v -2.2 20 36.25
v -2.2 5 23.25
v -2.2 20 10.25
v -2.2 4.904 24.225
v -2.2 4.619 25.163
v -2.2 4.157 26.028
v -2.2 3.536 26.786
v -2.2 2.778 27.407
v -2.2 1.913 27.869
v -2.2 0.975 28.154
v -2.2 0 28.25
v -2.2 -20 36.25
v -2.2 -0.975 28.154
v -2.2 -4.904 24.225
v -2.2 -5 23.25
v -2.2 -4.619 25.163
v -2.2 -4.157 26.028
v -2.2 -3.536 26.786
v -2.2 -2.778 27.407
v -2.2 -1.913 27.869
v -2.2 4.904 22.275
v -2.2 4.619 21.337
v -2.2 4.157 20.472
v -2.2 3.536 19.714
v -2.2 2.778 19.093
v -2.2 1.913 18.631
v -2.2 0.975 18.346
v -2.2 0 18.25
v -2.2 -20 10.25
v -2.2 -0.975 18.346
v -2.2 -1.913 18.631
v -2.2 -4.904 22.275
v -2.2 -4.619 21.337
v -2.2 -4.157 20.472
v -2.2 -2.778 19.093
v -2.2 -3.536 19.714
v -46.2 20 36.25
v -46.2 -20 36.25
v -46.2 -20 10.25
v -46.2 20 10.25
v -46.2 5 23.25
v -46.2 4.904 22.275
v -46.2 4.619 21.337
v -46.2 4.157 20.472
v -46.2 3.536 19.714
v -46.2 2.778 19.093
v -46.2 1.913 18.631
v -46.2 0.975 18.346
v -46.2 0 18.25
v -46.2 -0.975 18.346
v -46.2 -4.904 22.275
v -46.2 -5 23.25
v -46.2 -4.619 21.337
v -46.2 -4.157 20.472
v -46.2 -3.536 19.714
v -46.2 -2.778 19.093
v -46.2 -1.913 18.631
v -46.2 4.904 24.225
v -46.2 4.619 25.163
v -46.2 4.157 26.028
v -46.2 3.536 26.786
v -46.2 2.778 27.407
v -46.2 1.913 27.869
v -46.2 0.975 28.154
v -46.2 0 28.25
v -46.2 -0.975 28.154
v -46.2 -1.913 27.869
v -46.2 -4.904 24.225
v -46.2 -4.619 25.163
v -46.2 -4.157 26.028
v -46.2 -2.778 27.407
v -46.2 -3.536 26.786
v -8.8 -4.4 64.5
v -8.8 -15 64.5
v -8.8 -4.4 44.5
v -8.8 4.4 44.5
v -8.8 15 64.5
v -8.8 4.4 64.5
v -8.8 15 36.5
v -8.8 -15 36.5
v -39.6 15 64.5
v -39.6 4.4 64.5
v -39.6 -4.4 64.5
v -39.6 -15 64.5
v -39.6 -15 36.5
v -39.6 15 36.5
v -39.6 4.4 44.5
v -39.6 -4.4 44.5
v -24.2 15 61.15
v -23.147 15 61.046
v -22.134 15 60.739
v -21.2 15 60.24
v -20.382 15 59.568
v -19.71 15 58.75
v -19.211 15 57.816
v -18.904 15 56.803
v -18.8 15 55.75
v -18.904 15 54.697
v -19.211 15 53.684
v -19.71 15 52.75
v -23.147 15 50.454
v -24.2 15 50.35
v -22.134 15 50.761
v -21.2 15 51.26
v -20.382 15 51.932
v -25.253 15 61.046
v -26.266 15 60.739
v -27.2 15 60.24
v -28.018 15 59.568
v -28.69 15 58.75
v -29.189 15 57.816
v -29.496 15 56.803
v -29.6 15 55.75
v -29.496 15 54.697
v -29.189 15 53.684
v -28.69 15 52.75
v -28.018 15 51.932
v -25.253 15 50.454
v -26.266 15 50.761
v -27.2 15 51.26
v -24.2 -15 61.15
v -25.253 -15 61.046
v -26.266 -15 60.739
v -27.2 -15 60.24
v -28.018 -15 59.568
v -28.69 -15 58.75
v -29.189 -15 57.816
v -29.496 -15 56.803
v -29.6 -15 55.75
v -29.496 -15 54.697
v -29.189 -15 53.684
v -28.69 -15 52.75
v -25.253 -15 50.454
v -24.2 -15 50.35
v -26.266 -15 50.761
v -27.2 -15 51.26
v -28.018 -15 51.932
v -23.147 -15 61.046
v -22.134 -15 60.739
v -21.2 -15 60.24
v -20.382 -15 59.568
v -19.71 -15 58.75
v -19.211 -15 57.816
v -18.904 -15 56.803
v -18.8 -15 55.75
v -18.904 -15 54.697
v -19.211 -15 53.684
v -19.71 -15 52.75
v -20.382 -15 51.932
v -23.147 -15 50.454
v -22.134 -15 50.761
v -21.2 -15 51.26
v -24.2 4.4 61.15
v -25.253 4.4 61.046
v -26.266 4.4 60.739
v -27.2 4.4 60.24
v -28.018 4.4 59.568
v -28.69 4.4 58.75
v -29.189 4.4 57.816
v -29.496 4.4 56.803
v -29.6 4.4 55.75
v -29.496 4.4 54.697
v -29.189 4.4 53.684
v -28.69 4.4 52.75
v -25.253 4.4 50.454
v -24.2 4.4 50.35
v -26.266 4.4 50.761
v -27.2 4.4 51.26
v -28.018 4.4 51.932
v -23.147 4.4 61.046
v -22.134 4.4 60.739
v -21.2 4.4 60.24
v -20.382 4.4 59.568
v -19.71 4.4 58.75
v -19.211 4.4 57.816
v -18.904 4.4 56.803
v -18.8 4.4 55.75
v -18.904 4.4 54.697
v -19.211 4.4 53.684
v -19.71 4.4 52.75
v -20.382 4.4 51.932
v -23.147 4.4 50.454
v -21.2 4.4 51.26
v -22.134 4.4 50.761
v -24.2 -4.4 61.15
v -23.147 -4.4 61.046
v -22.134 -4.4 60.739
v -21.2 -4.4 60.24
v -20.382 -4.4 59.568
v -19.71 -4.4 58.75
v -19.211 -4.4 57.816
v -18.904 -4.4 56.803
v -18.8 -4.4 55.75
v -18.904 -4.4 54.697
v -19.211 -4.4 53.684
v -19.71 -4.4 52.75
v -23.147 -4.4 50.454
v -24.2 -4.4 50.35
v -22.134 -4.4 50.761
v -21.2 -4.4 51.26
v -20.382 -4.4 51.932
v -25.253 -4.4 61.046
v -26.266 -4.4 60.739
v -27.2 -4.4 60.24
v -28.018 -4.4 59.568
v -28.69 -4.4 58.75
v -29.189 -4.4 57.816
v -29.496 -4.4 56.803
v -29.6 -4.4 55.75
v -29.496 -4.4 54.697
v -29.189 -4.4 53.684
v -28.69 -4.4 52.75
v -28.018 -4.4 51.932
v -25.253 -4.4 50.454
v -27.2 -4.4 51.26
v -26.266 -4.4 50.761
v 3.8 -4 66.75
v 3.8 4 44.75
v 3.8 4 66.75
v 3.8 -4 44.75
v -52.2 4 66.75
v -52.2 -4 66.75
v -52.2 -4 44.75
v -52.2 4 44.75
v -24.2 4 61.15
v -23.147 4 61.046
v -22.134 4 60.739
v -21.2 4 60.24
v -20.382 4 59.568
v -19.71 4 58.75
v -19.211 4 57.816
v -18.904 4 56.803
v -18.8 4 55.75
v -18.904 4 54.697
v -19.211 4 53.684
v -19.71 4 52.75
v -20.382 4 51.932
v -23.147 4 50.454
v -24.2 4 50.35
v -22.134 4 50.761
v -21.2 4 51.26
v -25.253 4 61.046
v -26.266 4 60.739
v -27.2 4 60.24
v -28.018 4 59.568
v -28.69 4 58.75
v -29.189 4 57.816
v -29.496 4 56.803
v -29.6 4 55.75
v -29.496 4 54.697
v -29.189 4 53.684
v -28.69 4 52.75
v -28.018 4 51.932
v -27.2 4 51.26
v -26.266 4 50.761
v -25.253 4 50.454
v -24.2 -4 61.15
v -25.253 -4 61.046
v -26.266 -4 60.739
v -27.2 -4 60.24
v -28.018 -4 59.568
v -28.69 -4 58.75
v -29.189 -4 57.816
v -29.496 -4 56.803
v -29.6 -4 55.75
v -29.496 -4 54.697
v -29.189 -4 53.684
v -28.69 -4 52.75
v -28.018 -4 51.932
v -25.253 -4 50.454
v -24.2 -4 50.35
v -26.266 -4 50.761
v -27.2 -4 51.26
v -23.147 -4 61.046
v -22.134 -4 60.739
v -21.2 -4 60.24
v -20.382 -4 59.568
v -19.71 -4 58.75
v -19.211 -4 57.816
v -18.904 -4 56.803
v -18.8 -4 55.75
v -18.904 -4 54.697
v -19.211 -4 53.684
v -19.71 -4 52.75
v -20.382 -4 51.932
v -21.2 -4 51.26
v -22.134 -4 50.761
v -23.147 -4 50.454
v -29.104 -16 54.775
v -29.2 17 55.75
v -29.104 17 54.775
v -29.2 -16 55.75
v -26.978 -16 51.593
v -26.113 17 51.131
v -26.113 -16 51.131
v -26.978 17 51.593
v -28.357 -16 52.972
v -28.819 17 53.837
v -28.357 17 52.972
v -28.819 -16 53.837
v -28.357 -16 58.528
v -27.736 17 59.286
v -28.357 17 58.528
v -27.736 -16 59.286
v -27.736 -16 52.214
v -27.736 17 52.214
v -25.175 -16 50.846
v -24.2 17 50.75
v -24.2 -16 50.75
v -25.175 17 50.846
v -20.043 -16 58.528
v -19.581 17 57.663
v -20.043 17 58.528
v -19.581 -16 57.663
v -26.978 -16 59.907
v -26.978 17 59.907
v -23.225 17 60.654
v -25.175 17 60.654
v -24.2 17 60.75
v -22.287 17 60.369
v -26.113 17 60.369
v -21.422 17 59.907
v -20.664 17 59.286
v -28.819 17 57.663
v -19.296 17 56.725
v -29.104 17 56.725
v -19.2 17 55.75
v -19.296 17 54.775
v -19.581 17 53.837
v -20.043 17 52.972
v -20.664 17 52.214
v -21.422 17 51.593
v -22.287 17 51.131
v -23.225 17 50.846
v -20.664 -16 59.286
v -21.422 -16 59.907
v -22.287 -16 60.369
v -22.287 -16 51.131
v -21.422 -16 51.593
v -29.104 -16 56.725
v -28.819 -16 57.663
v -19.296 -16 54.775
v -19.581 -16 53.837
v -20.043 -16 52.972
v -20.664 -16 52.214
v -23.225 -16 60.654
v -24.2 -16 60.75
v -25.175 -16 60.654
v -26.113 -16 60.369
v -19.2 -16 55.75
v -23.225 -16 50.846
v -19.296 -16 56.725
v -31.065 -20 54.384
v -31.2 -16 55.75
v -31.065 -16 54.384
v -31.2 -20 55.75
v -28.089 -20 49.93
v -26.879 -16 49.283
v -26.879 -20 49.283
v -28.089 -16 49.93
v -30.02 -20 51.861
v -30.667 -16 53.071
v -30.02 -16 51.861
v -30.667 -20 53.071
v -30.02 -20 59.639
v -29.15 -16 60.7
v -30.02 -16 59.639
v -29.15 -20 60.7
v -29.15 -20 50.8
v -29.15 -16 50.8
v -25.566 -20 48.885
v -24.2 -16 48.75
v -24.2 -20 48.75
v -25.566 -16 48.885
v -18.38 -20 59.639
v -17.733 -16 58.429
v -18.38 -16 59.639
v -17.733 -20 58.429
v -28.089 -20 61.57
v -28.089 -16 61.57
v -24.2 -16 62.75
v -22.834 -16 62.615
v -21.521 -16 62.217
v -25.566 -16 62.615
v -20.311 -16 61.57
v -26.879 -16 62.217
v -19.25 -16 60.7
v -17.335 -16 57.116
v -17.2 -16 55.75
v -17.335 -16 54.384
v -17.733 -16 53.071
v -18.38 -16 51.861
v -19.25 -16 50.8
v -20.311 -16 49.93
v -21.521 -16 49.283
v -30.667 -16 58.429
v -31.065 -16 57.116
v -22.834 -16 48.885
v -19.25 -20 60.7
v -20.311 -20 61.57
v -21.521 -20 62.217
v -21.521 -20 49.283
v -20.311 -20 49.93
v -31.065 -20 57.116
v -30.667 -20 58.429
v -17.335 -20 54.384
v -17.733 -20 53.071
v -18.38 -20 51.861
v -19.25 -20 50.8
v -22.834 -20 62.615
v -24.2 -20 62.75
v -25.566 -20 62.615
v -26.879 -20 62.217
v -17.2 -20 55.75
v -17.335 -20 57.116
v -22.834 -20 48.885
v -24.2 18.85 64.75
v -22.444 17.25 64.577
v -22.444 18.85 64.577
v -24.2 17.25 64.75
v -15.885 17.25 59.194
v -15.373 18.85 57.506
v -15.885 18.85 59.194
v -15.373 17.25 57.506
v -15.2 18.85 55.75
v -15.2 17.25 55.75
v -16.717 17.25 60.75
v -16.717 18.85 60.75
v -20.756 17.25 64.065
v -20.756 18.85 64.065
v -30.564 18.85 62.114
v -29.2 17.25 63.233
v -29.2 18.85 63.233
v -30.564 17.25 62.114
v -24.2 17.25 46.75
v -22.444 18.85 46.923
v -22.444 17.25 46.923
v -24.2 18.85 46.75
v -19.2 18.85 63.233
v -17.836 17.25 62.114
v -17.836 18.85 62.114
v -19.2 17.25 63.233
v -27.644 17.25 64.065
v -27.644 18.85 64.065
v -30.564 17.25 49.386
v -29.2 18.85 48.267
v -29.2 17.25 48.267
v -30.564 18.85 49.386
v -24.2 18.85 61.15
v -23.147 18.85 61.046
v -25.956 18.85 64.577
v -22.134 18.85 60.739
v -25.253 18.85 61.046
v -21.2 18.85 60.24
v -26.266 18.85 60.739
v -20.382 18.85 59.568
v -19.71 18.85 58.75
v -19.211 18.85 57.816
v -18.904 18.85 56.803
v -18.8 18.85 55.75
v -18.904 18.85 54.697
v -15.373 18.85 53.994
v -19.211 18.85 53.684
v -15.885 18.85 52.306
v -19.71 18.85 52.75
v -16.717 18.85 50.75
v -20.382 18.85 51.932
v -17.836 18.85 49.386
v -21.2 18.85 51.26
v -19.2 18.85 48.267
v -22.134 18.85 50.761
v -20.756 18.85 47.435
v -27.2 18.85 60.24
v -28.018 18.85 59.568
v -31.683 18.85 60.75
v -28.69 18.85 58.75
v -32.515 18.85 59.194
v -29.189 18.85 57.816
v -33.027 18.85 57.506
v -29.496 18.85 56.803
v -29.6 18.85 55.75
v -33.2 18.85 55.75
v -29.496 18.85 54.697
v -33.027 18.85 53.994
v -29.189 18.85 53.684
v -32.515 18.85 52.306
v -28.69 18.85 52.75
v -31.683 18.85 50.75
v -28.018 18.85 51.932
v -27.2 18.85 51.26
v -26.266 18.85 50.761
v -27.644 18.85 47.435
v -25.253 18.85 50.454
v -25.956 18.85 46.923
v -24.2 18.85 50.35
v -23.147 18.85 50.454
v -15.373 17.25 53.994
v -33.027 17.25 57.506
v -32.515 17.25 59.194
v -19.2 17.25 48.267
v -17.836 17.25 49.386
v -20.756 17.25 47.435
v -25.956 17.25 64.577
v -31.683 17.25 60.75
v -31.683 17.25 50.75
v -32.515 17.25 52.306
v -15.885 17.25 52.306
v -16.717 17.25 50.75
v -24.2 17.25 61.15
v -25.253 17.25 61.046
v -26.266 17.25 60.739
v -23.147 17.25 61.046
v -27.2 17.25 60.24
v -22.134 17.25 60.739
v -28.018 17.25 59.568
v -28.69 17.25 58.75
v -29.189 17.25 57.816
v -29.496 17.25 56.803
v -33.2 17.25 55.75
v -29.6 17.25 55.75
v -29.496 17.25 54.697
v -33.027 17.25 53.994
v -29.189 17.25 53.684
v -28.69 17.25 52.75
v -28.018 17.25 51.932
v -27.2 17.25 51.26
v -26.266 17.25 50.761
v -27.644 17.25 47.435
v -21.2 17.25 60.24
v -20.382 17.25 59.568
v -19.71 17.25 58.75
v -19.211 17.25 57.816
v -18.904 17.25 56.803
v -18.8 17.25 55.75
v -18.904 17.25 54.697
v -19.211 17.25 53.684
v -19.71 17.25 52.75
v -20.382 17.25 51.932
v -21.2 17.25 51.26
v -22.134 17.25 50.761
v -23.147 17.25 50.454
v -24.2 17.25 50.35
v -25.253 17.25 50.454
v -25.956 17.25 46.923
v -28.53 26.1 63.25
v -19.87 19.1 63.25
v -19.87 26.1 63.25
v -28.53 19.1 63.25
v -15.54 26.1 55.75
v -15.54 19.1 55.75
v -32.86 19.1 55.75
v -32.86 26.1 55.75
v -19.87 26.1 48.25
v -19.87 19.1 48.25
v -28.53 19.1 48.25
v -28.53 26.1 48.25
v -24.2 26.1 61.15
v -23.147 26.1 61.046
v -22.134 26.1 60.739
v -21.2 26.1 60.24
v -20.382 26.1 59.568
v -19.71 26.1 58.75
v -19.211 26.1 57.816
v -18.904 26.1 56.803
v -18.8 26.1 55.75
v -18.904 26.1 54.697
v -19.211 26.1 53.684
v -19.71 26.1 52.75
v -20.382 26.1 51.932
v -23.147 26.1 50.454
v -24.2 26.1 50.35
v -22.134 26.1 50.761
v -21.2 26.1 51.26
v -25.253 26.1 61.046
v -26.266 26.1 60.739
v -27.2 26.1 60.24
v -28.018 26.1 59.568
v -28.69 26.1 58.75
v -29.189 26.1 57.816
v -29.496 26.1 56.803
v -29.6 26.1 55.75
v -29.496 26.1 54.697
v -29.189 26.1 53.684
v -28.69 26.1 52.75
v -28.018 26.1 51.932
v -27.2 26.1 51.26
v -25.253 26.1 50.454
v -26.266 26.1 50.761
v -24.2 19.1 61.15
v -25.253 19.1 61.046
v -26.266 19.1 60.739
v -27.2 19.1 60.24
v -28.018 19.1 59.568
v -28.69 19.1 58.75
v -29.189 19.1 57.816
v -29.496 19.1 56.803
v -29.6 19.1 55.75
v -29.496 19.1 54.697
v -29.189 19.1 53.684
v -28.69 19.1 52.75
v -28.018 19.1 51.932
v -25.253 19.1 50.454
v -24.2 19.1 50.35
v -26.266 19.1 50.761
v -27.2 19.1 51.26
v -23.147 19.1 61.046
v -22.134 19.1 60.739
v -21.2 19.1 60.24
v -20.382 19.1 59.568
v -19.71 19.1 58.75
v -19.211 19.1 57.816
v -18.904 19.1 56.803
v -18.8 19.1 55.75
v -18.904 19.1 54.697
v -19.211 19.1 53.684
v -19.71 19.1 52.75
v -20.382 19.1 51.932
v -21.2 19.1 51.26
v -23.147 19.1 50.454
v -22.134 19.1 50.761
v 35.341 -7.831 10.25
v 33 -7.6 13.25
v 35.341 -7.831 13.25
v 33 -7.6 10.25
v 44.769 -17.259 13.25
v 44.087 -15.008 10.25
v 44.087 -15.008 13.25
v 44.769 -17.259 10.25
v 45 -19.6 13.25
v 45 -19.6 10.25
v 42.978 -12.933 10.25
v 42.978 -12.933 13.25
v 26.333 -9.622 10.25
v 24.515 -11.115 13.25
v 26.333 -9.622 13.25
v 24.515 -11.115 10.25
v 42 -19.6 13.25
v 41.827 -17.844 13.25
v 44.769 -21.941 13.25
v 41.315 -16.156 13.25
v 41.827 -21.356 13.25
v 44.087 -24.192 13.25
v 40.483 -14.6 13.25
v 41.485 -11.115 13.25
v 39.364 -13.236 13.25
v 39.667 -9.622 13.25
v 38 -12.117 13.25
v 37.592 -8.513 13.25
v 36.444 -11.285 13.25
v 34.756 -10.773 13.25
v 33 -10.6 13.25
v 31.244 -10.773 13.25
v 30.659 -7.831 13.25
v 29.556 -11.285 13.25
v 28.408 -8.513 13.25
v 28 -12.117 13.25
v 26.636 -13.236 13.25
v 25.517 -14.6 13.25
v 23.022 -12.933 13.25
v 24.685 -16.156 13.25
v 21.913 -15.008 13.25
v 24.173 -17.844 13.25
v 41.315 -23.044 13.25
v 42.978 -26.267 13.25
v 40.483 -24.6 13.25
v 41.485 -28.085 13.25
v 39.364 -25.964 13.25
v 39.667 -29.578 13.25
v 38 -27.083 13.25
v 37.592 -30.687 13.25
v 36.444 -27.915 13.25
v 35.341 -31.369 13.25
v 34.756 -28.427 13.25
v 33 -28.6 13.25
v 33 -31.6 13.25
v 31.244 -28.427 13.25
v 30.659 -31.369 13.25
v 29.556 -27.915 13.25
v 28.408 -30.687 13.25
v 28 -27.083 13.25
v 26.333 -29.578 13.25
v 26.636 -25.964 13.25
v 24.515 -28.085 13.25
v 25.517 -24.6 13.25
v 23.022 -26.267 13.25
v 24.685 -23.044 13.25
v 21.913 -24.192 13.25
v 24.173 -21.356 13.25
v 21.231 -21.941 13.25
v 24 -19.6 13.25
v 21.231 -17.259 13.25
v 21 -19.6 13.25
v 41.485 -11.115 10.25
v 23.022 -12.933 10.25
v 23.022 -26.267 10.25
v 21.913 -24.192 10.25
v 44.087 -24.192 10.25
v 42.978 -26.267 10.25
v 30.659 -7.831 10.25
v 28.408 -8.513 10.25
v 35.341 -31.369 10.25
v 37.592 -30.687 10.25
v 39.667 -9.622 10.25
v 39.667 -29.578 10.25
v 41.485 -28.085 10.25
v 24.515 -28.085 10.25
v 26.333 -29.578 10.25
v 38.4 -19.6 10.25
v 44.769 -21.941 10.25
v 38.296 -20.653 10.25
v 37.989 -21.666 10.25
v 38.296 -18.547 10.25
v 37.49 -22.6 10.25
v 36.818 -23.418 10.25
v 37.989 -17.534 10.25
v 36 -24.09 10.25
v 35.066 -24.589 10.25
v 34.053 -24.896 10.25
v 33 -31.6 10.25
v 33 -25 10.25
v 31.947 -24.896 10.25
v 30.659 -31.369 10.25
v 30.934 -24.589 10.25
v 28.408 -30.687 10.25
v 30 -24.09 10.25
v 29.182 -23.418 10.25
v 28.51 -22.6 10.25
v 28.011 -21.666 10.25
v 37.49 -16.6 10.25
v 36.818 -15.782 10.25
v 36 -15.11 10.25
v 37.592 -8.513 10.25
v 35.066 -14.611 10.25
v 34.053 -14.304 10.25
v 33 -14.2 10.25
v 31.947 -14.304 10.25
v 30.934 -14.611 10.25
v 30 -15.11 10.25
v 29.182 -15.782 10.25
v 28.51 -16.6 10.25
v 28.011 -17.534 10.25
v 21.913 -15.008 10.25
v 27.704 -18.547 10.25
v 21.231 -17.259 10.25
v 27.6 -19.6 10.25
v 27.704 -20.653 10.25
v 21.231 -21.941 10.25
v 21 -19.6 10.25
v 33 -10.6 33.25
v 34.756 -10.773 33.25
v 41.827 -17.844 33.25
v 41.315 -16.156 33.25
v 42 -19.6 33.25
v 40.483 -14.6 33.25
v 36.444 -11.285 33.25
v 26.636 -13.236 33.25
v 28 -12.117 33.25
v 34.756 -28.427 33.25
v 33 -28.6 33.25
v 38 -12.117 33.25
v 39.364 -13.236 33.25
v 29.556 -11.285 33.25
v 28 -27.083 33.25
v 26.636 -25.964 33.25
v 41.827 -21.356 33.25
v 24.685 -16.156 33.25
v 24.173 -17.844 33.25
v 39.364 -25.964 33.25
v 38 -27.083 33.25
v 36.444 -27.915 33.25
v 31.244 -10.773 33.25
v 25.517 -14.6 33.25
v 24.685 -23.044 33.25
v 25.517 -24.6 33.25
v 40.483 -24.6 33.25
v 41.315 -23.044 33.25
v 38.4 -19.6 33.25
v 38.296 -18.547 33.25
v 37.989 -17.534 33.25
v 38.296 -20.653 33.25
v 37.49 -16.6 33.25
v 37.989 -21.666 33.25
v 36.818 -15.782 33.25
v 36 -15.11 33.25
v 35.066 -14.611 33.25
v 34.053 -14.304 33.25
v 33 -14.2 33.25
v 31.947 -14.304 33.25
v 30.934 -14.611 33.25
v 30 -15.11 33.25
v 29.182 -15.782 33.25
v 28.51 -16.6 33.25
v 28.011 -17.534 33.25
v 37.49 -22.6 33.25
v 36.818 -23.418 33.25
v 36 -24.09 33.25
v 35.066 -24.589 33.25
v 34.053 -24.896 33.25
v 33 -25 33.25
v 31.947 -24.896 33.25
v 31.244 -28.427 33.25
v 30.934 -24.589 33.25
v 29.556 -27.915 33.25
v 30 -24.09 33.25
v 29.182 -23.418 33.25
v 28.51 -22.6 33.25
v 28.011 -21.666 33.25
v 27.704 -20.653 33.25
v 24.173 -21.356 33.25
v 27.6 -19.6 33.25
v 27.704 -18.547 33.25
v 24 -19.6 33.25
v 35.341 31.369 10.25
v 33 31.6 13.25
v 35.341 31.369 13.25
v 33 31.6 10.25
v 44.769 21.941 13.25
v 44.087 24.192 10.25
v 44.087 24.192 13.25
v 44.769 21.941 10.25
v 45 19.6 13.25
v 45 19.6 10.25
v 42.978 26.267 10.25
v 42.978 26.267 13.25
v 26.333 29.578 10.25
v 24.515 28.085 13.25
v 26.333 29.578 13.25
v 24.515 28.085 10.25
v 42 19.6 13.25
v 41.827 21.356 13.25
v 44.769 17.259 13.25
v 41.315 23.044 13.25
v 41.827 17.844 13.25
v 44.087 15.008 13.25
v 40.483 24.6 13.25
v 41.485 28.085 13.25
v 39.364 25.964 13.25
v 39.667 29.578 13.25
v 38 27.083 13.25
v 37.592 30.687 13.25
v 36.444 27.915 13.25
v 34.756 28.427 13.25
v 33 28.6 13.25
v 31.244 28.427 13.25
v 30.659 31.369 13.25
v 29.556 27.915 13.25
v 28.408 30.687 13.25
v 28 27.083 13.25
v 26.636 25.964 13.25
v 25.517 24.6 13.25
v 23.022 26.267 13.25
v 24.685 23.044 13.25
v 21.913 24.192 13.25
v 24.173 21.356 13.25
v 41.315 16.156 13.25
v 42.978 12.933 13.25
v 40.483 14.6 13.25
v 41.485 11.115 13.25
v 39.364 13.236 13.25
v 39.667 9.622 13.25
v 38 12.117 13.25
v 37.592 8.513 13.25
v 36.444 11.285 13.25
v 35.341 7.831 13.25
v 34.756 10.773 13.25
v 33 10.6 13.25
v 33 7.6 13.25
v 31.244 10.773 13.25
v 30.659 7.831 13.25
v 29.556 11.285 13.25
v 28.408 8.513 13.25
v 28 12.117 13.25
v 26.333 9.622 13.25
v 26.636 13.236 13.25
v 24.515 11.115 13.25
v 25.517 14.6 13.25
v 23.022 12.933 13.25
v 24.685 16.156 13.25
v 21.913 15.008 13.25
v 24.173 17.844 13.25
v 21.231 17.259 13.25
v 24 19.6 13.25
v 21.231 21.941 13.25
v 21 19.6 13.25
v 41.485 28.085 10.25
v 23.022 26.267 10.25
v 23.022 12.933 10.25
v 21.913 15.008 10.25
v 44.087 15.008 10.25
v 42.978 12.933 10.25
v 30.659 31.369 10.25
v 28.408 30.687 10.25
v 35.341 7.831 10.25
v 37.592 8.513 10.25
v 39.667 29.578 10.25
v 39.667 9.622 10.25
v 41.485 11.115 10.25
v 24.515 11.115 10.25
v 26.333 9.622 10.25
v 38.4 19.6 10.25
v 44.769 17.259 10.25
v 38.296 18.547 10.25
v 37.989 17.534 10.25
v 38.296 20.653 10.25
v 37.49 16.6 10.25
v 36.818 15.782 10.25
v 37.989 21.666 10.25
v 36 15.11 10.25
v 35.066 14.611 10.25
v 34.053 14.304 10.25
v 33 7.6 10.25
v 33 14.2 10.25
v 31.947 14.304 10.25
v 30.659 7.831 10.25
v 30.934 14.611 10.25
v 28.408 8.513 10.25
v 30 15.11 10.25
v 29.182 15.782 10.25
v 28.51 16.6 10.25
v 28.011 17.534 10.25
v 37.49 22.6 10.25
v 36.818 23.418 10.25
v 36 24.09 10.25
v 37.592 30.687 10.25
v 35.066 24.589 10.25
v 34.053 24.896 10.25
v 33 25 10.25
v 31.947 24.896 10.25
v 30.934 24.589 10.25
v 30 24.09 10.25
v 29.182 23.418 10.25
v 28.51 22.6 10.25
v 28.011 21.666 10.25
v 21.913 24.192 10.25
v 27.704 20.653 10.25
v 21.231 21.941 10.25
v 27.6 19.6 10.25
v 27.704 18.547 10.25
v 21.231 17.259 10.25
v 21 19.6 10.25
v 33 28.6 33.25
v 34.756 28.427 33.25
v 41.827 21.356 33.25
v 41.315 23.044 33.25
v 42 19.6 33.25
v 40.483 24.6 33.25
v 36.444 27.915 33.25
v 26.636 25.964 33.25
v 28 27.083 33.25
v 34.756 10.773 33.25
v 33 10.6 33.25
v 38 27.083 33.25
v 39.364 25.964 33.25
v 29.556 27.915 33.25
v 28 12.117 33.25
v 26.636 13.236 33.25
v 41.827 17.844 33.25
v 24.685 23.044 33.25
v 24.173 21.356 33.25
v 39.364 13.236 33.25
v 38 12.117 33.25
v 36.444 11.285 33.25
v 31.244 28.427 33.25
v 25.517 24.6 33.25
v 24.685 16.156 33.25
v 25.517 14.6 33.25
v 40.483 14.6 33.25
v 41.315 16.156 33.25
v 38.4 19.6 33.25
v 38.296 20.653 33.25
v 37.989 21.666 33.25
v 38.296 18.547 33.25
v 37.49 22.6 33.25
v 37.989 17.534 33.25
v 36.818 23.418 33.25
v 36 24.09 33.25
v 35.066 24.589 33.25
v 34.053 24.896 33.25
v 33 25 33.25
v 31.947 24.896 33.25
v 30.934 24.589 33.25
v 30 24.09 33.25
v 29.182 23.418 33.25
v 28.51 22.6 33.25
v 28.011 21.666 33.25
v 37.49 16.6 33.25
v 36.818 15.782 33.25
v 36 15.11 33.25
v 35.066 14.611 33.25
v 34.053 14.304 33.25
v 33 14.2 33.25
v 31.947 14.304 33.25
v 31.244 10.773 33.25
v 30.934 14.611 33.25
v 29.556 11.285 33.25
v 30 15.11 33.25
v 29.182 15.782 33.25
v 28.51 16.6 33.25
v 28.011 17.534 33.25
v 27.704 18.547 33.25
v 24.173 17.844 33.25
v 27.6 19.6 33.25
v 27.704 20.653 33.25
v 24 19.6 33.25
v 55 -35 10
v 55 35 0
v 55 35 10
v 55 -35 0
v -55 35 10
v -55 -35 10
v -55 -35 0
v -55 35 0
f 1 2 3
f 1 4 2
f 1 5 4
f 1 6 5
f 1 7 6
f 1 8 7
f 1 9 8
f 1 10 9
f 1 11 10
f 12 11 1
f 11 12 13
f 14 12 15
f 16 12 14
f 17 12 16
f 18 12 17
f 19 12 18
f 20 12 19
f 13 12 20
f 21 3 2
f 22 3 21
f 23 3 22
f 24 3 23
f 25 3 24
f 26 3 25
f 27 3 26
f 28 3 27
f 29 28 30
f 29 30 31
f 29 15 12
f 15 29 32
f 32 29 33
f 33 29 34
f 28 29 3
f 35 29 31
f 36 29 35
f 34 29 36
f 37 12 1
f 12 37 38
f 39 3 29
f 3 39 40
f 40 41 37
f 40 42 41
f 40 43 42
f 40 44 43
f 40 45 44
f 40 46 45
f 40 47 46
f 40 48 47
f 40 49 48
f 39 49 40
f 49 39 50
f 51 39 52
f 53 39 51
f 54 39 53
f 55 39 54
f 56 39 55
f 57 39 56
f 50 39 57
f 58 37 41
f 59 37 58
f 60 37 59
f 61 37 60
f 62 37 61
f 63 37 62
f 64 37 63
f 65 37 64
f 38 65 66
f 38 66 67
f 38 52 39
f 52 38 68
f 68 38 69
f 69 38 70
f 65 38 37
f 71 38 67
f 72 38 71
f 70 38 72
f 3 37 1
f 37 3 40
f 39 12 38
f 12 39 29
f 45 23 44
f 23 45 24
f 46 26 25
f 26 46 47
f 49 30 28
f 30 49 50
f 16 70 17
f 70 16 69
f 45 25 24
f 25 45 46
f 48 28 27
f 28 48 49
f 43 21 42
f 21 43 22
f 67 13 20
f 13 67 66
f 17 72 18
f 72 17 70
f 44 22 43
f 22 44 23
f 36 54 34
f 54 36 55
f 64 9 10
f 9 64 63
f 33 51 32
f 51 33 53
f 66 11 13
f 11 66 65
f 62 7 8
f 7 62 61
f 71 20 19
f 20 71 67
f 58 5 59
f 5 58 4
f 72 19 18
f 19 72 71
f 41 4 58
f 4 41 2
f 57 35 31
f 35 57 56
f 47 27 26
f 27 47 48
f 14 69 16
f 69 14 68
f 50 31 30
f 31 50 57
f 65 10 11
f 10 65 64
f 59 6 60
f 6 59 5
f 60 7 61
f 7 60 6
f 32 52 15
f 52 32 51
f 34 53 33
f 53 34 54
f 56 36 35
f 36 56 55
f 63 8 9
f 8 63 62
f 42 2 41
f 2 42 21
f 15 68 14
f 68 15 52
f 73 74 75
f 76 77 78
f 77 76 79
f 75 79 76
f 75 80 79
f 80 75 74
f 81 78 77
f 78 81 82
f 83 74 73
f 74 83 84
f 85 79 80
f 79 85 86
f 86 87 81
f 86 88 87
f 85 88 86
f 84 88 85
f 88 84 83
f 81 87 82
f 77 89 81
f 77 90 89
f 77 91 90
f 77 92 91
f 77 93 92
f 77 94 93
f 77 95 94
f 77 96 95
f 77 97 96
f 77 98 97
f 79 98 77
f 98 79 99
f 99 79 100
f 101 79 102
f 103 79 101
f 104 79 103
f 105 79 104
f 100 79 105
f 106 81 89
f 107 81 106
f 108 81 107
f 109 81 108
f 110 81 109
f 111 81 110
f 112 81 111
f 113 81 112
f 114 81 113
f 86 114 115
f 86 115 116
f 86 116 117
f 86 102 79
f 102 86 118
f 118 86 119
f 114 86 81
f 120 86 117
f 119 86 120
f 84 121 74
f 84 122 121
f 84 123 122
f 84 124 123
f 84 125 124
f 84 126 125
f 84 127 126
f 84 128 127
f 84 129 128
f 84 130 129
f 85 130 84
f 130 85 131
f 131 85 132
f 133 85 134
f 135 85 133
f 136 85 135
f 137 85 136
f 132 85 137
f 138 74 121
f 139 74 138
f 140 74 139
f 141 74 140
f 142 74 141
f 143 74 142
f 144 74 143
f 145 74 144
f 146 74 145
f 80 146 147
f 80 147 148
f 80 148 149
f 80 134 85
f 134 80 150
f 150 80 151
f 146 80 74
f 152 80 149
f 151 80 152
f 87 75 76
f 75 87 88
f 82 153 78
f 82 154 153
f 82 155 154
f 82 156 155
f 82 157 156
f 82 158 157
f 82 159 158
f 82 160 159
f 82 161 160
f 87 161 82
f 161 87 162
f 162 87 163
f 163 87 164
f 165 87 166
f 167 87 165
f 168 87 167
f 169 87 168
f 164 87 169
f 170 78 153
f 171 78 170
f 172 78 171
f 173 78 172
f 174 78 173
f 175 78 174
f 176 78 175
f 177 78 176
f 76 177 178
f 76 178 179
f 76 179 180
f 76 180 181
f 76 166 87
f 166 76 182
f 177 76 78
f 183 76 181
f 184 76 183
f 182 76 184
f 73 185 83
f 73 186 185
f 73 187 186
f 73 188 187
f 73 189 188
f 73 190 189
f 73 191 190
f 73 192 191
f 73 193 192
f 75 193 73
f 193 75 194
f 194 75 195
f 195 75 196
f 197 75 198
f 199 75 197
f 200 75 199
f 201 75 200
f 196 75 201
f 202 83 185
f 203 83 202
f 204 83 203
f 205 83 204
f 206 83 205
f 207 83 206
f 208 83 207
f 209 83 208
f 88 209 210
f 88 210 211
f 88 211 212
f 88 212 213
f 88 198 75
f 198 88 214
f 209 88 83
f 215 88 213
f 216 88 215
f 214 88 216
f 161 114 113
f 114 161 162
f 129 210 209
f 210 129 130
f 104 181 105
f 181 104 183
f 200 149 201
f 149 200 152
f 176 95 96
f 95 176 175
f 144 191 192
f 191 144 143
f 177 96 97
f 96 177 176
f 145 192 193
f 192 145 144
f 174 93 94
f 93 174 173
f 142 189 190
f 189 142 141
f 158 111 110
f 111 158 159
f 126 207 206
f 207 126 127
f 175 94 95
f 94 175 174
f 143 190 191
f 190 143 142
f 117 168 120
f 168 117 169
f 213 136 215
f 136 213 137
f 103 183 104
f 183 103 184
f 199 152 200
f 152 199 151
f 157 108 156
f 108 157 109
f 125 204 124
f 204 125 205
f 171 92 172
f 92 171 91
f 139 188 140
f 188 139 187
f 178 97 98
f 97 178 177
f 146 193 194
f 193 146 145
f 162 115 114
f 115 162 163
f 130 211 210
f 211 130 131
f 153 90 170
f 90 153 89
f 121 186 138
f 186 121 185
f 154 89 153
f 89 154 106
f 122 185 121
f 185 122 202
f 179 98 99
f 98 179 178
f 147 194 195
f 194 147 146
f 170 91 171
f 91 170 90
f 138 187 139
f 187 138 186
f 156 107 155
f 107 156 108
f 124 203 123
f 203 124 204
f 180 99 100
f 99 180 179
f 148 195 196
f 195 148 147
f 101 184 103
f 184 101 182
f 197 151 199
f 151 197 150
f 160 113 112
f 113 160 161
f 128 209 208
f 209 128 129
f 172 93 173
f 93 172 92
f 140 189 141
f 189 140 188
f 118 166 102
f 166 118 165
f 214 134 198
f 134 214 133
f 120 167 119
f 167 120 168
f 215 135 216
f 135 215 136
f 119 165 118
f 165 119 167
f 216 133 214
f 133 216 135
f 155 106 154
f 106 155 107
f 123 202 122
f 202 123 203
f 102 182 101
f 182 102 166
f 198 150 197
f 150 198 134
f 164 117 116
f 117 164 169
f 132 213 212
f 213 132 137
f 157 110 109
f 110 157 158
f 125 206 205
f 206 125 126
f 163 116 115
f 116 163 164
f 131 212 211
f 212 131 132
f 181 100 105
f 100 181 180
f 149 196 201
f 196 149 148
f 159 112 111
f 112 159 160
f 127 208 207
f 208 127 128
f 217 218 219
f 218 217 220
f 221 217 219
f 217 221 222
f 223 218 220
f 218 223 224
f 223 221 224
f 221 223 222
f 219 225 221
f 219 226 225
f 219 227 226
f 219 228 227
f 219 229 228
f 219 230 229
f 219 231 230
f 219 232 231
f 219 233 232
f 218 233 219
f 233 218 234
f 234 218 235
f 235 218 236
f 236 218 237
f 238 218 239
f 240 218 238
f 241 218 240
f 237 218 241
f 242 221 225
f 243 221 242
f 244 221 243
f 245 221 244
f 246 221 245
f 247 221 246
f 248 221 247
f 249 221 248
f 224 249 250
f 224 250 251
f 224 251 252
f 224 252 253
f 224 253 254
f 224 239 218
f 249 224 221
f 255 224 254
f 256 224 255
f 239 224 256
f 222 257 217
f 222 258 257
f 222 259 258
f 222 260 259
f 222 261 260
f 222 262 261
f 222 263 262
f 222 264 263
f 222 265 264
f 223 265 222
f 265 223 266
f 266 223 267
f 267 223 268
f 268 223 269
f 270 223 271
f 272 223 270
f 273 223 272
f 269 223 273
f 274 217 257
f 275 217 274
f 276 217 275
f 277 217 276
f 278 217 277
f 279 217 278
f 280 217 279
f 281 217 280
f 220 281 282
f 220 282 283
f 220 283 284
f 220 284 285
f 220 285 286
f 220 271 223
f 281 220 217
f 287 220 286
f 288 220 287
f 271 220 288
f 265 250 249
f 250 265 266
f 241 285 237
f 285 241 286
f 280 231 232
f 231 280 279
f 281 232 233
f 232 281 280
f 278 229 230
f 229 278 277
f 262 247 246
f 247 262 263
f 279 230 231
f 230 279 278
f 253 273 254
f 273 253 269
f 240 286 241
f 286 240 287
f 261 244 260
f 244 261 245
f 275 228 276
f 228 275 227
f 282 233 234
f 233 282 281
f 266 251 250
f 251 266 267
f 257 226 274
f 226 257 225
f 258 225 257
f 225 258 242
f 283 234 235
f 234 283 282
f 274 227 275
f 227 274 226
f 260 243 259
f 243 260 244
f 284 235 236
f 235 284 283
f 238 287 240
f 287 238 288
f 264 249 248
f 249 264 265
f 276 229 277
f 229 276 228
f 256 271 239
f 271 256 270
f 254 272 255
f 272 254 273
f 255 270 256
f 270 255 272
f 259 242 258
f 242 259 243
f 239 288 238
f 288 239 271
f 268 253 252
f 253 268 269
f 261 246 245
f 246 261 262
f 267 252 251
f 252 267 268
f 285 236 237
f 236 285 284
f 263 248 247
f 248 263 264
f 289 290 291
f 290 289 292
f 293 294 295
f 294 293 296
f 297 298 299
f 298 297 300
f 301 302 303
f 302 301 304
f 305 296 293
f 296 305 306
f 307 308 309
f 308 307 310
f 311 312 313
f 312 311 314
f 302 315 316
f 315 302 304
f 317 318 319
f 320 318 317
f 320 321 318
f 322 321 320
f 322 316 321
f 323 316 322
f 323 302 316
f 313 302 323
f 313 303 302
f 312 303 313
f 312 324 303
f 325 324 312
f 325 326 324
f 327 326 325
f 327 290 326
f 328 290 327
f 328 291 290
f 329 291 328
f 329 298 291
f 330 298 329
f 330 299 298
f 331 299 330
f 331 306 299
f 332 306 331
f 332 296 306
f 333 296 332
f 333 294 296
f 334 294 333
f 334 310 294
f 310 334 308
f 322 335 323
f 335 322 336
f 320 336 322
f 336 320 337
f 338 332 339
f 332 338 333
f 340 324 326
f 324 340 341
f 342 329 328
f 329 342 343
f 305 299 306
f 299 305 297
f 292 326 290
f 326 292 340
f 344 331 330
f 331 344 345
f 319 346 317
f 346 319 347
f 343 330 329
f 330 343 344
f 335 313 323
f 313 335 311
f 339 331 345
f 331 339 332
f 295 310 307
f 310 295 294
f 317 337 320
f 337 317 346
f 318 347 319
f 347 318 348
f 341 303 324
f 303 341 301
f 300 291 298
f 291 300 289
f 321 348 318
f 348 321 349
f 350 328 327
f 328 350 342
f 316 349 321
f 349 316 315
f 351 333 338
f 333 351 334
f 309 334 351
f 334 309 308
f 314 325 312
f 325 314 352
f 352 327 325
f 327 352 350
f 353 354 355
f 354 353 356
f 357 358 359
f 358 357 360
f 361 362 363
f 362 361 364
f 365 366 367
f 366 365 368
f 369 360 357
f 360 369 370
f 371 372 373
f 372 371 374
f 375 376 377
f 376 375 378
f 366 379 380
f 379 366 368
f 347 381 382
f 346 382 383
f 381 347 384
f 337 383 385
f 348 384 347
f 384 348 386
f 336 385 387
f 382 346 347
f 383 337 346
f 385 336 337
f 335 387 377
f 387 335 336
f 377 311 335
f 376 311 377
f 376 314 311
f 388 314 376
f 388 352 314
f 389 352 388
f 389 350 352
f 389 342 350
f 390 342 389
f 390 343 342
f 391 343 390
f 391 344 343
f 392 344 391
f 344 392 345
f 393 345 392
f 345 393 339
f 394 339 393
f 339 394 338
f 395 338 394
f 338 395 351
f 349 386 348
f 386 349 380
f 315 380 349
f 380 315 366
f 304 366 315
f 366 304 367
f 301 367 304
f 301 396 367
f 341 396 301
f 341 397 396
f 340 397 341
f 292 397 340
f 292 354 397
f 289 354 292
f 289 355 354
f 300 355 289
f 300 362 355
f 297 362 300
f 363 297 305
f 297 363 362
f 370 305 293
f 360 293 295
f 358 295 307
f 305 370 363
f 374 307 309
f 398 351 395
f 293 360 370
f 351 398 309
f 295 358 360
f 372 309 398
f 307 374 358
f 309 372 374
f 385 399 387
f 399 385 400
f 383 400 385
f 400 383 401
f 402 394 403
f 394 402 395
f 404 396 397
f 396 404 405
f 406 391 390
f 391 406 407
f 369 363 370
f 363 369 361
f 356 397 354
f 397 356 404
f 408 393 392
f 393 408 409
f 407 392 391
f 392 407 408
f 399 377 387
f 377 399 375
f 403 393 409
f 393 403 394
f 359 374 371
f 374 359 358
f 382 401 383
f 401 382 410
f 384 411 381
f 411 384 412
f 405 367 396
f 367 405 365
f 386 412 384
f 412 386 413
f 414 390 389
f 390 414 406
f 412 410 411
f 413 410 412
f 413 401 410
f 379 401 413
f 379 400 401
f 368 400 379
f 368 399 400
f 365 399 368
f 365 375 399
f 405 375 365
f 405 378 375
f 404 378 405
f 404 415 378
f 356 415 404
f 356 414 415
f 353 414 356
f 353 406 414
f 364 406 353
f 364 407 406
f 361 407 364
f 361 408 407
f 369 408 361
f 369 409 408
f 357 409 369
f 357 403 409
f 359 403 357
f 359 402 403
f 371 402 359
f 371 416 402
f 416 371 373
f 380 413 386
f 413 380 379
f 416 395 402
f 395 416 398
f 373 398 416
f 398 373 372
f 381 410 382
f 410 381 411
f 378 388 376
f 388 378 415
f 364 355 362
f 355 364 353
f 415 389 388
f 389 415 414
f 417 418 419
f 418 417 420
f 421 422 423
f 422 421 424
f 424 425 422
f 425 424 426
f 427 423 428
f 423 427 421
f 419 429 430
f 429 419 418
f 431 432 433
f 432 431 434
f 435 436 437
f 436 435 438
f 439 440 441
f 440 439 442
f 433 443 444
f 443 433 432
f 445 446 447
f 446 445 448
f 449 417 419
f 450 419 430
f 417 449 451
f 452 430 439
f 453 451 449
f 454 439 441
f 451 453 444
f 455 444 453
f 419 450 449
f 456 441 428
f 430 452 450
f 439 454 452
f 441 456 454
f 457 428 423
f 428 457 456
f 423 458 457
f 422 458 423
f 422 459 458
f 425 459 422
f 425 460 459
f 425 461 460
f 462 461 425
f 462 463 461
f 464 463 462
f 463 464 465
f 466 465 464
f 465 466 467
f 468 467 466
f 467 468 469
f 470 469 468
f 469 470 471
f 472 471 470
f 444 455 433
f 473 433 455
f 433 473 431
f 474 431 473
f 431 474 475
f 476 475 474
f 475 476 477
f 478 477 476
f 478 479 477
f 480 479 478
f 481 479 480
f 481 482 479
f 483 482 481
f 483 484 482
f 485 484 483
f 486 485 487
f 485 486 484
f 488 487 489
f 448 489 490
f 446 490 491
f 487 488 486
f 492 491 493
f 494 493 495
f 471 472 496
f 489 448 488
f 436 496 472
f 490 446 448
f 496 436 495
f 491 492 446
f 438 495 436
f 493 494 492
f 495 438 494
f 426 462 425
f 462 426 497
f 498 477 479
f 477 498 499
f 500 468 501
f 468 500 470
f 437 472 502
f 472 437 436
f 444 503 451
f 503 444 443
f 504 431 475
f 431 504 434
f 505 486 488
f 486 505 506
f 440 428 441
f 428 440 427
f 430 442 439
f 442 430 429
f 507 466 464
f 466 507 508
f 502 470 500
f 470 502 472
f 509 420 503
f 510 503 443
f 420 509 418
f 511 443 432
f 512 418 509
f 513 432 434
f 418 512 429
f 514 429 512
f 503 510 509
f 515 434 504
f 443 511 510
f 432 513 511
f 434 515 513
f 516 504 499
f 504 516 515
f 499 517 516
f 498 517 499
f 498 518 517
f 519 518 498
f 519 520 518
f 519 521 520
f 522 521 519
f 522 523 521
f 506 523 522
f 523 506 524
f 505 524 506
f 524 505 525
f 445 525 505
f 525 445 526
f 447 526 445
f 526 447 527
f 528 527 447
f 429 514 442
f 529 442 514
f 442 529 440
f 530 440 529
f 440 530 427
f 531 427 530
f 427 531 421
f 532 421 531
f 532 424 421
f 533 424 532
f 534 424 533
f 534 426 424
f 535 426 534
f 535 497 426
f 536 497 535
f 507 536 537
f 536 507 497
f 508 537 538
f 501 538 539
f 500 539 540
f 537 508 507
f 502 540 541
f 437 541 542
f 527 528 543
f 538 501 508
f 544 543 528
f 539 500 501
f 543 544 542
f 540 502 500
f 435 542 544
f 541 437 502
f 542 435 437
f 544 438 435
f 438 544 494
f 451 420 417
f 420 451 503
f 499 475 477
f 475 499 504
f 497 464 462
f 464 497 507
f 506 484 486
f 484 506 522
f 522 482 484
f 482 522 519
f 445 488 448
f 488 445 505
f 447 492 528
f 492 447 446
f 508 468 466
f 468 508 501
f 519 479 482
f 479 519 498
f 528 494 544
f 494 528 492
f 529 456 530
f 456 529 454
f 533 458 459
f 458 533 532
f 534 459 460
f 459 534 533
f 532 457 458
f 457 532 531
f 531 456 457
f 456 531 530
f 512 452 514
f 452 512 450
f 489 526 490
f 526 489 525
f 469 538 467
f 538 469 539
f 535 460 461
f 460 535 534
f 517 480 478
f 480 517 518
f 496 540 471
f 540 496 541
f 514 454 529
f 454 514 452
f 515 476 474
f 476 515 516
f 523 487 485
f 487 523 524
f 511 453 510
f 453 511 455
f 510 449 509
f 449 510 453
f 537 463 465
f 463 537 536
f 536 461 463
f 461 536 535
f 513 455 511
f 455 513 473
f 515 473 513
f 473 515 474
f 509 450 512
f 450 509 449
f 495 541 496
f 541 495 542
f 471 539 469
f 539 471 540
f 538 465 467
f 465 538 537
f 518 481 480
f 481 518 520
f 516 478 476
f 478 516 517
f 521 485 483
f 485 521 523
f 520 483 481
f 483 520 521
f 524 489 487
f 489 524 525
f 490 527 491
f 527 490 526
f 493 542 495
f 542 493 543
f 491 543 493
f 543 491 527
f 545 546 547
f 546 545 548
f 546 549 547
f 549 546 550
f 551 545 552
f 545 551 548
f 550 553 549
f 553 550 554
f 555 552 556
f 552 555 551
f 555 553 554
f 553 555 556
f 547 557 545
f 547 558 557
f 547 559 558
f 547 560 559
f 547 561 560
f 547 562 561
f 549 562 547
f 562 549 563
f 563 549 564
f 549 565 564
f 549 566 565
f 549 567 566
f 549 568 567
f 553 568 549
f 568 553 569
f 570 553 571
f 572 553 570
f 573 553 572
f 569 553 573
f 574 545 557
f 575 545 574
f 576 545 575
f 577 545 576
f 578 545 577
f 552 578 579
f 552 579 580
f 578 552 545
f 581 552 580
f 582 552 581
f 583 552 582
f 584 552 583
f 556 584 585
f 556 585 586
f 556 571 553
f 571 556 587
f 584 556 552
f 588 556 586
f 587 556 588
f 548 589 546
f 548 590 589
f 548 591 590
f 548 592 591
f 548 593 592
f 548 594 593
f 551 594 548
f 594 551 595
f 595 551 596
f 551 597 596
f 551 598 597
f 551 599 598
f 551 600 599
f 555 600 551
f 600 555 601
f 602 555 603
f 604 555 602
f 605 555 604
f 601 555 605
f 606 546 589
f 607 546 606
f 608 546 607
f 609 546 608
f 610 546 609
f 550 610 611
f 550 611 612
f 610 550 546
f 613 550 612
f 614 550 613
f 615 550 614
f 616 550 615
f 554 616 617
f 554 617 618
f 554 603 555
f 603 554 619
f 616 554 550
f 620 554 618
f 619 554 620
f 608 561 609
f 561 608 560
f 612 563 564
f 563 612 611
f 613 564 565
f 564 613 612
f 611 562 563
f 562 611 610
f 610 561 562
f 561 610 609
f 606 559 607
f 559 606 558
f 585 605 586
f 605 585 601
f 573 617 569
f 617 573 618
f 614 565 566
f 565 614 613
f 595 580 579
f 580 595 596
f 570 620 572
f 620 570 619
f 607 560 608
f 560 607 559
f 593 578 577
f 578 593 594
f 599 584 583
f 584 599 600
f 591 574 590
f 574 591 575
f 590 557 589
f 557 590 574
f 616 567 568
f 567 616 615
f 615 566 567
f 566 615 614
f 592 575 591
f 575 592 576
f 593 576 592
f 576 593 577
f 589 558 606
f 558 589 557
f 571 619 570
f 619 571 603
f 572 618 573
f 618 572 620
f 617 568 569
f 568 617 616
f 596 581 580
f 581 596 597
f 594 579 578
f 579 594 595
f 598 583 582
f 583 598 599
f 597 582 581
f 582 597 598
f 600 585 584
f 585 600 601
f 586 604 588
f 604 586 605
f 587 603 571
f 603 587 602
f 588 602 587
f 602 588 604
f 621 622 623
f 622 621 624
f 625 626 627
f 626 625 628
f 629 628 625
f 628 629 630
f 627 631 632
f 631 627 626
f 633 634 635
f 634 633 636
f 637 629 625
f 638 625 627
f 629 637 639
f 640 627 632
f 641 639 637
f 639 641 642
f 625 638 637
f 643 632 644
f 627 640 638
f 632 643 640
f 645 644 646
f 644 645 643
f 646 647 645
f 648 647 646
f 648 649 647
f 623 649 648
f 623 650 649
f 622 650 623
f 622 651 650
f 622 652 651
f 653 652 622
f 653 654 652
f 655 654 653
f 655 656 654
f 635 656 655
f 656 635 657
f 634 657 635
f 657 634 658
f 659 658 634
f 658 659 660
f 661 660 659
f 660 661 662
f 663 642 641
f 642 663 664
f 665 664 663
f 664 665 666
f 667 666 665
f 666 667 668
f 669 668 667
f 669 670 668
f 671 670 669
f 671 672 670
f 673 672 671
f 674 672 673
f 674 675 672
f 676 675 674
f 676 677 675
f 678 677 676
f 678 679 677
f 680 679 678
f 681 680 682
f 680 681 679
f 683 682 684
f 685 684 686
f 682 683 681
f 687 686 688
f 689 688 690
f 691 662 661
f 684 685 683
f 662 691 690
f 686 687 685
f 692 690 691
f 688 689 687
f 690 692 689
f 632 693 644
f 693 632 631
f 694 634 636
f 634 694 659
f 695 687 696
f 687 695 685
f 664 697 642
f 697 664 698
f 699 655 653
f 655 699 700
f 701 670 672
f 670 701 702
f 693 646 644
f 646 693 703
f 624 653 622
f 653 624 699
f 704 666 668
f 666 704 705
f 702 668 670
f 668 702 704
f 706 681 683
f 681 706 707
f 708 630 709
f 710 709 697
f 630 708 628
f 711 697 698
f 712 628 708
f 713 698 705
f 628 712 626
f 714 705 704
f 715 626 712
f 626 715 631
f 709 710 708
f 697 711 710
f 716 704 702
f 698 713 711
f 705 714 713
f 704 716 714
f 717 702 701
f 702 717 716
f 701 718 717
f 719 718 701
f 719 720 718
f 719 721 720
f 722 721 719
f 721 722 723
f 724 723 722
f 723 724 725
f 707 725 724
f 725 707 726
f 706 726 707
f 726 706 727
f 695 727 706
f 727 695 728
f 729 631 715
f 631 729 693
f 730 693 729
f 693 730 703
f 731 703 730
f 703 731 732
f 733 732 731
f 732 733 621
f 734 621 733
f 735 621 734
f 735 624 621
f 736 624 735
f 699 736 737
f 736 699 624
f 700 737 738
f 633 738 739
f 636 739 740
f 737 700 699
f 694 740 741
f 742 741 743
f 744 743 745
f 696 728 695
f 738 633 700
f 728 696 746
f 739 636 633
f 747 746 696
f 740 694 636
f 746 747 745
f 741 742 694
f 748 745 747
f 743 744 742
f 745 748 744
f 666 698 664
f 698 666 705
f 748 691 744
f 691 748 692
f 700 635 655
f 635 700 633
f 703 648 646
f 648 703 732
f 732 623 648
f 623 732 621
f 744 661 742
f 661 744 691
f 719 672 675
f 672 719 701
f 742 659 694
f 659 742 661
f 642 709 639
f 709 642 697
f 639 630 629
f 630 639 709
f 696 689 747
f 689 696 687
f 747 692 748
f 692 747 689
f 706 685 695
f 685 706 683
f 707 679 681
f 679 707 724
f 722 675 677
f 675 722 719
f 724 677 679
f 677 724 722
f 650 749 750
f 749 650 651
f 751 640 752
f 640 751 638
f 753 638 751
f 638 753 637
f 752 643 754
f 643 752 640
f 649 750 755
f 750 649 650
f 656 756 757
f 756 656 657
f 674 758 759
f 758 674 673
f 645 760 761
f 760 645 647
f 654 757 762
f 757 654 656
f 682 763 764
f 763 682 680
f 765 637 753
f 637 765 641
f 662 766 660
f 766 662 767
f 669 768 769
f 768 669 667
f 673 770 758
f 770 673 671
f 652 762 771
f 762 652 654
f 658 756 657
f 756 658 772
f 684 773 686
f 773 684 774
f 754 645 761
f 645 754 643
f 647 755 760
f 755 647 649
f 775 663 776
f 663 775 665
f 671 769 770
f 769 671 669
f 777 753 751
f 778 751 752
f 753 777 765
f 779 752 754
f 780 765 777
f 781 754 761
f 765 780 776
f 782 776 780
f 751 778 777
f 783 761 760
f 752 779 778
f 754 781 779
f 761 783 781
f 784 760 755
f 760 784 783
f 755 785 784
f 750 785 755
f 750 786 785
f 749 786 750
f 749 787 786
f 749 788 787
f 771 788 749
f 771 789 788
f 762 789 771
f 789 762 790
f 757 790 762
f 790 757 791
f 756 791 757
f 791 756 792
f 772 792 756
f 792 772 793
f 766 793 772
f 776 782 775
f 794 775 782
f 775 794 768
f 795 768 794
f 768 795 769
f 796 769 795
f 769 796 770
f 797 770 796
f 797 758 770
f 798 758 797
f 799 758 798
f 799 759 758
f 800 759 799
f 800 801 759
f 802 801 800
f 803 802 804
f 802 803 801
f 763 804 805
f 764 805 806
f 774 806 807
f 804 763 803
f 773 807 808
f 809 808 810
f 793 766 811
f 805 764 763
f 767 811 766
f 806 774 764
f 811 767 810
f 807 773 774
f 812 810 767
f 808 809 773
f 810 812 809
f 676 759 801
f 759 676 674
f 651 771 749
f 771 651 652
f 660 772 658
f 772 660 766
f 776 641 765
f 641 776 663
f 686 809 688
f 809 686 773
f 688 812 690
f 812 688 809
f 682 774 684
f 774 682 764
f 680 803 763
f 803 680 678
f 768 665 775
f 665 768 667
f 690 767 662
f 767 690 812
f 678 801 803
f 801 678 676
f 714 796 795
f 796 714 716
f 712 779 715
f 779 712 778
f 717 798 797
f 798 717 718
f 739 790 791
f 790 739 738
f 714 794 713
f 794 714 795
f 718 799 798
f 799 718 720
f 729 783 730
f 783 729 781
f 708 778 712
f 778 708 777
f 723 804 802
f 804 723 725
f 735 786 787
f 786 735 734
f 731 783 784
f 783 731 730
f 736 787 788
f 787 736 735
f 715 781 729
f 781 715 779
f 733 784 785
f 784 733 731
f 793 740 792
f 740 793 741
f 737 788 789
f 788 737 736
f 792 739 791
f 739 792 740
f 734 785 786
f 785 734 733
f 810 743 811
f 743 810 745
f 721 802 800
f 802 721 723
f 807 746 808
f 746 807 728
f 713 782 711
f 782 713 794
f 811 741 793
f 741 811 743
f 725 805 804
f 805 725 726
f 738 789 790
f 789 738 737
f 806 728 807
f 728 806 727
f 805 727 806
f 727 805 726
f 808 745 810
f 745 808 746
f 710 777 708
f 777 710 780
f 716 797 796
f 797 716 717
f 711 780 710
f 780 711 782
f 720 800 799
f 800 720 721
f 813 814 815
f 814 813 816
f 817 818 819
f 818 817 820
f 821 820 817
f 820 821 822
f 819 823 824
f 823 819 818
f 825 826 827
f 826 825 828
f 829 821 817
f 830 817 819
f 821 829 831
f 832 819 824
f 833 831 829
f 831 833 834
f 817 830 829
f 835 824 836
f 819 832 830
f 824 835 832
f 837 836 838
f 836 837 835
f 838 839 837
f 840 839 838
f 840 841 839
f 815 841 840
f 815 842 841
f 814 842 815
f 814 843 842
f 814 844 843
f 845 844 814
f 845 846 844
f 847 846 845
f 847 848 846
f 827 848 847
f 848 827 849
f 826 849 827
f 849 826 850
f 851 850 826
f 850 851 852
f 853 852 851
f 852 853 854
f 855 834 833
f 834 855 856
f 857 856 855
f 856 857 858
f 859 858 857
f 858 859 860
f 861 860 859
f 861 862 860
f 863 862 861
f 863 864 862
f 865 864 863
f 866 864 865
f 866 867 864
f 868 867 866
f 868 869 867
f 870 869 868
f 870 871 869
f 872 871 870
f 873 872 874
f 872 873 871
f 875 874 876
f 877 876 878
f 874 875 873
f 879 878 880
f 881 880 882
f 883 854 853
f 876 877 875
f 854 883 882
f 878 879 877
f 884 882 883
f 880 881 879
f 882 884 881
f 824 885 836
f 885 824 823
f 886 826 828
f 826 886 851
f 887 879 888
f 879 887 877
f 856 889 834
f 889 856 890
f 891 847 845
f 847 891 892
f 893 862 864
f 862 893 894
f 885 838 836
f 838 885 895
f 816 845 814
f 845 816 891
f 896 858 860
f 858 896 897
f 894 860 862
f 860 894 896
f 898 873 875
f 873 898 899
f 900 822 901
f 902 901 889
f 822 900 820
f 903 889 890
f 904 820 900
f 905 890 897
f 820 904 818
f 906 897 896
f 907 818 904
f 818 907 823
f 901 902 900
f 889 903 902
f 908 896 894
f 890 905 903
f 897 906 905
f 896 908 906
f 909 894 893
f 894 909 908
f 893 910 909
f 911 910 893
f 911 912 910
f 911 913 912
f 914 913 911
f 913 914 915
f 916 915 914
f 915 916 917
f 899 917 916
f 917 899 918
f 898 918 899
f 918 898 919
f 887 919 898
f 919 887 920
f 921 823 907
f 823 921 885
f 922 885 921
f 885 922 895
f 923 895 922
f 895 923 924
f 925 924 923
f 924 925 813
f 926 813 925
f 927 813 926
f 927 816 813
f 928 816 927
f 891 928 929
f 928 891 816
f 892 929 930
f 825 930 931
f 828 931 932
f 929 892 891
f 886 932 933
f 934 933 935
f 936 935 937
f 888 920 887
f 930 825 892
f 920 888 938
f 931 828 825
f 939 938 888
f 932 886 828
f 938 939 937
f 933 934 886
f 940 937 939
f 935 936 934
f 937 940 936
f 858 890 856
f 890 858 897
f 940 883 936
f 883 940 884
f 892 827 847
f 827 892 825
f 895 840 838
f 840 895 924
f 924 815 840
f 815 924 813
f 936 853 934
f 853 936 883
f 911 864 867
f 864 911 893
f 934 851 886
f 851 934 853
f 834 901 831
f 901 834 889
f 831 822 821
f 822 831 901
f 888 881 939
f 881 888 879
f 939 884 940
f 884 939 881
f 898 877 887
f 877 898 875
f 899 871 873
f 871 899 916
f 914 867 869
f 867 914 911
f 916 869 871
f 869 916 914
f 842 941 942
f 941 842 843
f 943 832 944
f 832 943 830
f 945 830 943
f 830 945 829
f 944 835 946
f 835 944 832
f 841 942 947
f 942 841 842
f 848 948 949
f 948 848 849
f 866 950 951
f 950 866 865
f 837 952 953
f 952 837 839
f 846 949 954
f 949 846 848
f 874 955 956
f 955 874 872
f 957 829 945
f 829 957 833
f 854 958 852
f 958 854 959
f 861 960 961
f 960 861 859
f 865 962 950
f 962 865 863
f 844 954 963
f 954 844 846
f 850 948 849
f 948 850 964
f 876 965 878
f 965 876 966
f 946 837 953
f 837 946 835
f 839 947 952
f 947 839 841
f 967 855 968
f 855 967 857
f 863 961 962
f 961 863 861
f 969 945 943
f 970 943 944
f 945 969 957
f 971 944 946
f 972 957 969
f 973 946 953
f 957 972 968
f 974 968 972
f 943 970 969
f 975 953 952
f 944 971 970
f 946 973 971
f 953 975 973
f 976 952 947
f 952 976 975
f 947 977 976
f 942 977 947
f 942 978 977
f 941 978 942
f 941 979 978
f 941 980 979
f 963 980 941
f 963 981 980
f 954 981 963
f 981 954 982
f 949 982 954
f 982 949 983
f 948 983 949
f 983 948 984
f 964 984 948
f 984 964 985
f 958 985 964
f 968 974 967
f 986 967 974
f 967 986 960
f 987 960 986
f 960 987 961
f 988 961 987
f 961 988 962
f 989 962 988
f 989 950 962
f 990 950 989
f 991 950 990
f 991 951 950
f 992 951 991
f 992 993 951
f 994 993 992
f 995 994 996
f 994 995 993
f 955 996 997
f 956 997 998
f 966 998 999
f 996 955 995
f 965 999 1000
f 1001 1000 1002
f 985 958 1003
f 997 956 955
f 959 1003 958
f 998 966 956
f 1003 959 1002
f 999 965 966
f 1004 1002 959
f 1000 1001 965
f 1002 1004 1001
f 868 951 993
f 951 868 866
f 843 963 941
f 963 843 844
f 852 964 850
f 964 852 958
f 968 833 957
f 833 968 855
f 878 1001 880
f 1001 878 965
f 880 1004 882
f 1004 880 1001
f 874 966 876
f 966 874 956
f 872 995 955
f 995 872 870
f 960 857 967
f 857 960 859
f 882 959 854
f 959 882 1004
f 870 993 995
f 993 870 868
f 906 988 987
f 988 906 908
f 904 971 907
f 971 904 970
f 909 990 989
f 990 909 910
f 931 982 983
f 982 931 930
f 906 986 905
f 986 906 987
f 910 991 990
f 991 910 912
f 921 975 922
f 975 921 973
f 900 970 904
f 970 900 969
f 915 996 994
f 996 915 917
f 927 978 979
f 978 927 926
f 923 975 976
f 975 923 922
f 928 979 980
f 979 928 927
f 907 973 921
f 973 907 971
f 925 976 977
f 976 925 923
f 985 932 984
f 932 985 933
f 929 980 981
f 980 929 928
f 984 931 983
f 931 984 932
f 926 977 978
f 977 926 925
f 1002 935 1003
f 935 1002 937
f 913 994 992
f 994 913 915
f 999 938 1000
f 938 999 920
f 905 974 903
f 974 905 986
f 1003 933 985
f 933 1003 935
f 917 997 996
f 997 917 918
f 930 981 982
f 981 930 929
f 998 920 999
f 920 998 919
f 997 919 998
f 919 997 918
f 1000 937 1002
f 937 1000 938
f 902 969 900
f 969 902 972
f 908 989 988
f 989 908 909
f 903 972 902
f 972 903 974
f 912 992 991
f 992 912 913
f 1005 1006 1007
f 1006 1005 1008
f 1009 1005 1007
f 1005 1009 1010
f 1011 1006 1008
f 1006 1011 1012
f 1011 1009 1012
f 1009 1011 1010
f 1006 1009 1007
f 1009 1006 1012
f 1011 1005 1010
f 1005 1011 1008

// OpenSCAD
$fn = 32;

// ------------------------------------------------------------------------
// Indexing jig: plate 110 x 70 mm, pin d10
// Every part is its own module, assembly() places every instance.
// ------------------------------------------------------------------------

// --- part 1 ---
module jig_plate() {
  difference() {
    translate([-55, -35, 0]) cube([110, 70, 10]);
  }
}

// --- part 2 ---
module locator_block() {
  difference() {
    translate([-22, -20, 0]) cube([44, 40, 26]);
    translate([0, 0, 13]) rotate([0, 90, 0]) cylinder(h = 46, d = 10, center = true);
  }
}

// --- part 3 ---
module index_fork() {
  difference() {
    translate([-15.4, -15, 0]) cube([30.8, 30, 28]);
    translate([-16.4, -4.4, 8]) cube([32.8, 8.8, 21]);
    translate([0, 0, 19.25]) rotate([90, 0, 0]) cylinder(h = 32, d = 10.8, center = true);
  }
}

// --- part 4 ---
module index_arm() {
  difference() {
    translate([-28, -4, 0]) cube([56, 8, 22]);
    translate([0, 0, 11]) rotate([90, 0, 0]) cylinder(h = 10, d = 10.8, center = true);
  }
}

// --- part 5 ---
module index_pin() {
  rotate([0, 90, 0]) cylinder(h = 34, d = 10, center = true);
  translate([-20, 0, 0]) rotate([0, 90, 0]) cylinder(h = 4, d = 14);
}

// --- part 6 ---
module pin_washer() {
  difference() {
      translate([0, 0, 0]) cylinder(h = 1.6, d = 18);
      translate([0, 0, -1]) cylinder(h = 3.6, d = 10.8);
    }
}

// --- part 7 ---
module lock_nut() {
  difference() {
    linear_extrude(height = 7) polygon(points = [[8.66, 0], [4.33, 7.5], [-4.33, 7.5], [-8.66, 0], [-4.33, -7.5], [4.33, -7.5]]);
    translate([0, 0, -1]) cylinder(h = 9, d = 10.8);
  }
}

// --- part 8 ---
module guide_bush_a() {
  difference() {
    union() {
      cylinder(h = 3, d = 24);
      translate([0, 0, 3]) cylinder(h = 20, d = 18);
    }
    translate([0, 0, -1]) cylinder(h = 25, d = 10.8);
  }
}

// --- part 9 ---
module guide_bush_b() {
  difference() {
    union() {
      cylinder(h = 3, d = 24);
      translate([0, 0, 3]) cylinder(h = 20, d = 18);
    }
    translate([0, 0, -1]) cylinder(h = 25, d = 10.8);
  }
}

// --- assembly ---
module assembly() {
  color([0.80, 0.24, 0.20]) translate([0, 0, 0]) rotate([0, 0, 0]) jig_plate();
  color([0.20, 0.45, 0.75]) translate([-24.2, 0, 10.25]) rotate([0, 0, 0]) locator_block();
  color([0.25, 0.62, 0.32]) translate([-24.2, 0, 36.5]) rotate([0, 0, 0]) index_fork();
  color([0.92, 0.70, 0.18]) translate([-24.2, 0, 44.75]) rotate([0, 0, 0]) index_arm();
  color([0.58, 0.35, 0.70]) translate([-24.2, 0, 55.75]) rotate([0, 0, 90]) index_pin();
  color([0.16, 0.66, 0.66]) translate([-24.2, 18.85, 55.75]) rotate([90, 0, 0]) pin_washer();
  color([0.85, 0.48, 0.18]) translate([-24.2, 26.1, 55.75]) rotate([90, 0, 0]) lock_nut();
  color([0.55, 0.60, 0.65]) translate([33, -19.6, 10.25]) rotate([0, 0, 0]) guide_bush_a();
  color([0.75, 0.30, 0.55]) translate([33, 19.6, 10.25]) rotate([0, 0, 0]) guide_bush_b();
}

assembly();
